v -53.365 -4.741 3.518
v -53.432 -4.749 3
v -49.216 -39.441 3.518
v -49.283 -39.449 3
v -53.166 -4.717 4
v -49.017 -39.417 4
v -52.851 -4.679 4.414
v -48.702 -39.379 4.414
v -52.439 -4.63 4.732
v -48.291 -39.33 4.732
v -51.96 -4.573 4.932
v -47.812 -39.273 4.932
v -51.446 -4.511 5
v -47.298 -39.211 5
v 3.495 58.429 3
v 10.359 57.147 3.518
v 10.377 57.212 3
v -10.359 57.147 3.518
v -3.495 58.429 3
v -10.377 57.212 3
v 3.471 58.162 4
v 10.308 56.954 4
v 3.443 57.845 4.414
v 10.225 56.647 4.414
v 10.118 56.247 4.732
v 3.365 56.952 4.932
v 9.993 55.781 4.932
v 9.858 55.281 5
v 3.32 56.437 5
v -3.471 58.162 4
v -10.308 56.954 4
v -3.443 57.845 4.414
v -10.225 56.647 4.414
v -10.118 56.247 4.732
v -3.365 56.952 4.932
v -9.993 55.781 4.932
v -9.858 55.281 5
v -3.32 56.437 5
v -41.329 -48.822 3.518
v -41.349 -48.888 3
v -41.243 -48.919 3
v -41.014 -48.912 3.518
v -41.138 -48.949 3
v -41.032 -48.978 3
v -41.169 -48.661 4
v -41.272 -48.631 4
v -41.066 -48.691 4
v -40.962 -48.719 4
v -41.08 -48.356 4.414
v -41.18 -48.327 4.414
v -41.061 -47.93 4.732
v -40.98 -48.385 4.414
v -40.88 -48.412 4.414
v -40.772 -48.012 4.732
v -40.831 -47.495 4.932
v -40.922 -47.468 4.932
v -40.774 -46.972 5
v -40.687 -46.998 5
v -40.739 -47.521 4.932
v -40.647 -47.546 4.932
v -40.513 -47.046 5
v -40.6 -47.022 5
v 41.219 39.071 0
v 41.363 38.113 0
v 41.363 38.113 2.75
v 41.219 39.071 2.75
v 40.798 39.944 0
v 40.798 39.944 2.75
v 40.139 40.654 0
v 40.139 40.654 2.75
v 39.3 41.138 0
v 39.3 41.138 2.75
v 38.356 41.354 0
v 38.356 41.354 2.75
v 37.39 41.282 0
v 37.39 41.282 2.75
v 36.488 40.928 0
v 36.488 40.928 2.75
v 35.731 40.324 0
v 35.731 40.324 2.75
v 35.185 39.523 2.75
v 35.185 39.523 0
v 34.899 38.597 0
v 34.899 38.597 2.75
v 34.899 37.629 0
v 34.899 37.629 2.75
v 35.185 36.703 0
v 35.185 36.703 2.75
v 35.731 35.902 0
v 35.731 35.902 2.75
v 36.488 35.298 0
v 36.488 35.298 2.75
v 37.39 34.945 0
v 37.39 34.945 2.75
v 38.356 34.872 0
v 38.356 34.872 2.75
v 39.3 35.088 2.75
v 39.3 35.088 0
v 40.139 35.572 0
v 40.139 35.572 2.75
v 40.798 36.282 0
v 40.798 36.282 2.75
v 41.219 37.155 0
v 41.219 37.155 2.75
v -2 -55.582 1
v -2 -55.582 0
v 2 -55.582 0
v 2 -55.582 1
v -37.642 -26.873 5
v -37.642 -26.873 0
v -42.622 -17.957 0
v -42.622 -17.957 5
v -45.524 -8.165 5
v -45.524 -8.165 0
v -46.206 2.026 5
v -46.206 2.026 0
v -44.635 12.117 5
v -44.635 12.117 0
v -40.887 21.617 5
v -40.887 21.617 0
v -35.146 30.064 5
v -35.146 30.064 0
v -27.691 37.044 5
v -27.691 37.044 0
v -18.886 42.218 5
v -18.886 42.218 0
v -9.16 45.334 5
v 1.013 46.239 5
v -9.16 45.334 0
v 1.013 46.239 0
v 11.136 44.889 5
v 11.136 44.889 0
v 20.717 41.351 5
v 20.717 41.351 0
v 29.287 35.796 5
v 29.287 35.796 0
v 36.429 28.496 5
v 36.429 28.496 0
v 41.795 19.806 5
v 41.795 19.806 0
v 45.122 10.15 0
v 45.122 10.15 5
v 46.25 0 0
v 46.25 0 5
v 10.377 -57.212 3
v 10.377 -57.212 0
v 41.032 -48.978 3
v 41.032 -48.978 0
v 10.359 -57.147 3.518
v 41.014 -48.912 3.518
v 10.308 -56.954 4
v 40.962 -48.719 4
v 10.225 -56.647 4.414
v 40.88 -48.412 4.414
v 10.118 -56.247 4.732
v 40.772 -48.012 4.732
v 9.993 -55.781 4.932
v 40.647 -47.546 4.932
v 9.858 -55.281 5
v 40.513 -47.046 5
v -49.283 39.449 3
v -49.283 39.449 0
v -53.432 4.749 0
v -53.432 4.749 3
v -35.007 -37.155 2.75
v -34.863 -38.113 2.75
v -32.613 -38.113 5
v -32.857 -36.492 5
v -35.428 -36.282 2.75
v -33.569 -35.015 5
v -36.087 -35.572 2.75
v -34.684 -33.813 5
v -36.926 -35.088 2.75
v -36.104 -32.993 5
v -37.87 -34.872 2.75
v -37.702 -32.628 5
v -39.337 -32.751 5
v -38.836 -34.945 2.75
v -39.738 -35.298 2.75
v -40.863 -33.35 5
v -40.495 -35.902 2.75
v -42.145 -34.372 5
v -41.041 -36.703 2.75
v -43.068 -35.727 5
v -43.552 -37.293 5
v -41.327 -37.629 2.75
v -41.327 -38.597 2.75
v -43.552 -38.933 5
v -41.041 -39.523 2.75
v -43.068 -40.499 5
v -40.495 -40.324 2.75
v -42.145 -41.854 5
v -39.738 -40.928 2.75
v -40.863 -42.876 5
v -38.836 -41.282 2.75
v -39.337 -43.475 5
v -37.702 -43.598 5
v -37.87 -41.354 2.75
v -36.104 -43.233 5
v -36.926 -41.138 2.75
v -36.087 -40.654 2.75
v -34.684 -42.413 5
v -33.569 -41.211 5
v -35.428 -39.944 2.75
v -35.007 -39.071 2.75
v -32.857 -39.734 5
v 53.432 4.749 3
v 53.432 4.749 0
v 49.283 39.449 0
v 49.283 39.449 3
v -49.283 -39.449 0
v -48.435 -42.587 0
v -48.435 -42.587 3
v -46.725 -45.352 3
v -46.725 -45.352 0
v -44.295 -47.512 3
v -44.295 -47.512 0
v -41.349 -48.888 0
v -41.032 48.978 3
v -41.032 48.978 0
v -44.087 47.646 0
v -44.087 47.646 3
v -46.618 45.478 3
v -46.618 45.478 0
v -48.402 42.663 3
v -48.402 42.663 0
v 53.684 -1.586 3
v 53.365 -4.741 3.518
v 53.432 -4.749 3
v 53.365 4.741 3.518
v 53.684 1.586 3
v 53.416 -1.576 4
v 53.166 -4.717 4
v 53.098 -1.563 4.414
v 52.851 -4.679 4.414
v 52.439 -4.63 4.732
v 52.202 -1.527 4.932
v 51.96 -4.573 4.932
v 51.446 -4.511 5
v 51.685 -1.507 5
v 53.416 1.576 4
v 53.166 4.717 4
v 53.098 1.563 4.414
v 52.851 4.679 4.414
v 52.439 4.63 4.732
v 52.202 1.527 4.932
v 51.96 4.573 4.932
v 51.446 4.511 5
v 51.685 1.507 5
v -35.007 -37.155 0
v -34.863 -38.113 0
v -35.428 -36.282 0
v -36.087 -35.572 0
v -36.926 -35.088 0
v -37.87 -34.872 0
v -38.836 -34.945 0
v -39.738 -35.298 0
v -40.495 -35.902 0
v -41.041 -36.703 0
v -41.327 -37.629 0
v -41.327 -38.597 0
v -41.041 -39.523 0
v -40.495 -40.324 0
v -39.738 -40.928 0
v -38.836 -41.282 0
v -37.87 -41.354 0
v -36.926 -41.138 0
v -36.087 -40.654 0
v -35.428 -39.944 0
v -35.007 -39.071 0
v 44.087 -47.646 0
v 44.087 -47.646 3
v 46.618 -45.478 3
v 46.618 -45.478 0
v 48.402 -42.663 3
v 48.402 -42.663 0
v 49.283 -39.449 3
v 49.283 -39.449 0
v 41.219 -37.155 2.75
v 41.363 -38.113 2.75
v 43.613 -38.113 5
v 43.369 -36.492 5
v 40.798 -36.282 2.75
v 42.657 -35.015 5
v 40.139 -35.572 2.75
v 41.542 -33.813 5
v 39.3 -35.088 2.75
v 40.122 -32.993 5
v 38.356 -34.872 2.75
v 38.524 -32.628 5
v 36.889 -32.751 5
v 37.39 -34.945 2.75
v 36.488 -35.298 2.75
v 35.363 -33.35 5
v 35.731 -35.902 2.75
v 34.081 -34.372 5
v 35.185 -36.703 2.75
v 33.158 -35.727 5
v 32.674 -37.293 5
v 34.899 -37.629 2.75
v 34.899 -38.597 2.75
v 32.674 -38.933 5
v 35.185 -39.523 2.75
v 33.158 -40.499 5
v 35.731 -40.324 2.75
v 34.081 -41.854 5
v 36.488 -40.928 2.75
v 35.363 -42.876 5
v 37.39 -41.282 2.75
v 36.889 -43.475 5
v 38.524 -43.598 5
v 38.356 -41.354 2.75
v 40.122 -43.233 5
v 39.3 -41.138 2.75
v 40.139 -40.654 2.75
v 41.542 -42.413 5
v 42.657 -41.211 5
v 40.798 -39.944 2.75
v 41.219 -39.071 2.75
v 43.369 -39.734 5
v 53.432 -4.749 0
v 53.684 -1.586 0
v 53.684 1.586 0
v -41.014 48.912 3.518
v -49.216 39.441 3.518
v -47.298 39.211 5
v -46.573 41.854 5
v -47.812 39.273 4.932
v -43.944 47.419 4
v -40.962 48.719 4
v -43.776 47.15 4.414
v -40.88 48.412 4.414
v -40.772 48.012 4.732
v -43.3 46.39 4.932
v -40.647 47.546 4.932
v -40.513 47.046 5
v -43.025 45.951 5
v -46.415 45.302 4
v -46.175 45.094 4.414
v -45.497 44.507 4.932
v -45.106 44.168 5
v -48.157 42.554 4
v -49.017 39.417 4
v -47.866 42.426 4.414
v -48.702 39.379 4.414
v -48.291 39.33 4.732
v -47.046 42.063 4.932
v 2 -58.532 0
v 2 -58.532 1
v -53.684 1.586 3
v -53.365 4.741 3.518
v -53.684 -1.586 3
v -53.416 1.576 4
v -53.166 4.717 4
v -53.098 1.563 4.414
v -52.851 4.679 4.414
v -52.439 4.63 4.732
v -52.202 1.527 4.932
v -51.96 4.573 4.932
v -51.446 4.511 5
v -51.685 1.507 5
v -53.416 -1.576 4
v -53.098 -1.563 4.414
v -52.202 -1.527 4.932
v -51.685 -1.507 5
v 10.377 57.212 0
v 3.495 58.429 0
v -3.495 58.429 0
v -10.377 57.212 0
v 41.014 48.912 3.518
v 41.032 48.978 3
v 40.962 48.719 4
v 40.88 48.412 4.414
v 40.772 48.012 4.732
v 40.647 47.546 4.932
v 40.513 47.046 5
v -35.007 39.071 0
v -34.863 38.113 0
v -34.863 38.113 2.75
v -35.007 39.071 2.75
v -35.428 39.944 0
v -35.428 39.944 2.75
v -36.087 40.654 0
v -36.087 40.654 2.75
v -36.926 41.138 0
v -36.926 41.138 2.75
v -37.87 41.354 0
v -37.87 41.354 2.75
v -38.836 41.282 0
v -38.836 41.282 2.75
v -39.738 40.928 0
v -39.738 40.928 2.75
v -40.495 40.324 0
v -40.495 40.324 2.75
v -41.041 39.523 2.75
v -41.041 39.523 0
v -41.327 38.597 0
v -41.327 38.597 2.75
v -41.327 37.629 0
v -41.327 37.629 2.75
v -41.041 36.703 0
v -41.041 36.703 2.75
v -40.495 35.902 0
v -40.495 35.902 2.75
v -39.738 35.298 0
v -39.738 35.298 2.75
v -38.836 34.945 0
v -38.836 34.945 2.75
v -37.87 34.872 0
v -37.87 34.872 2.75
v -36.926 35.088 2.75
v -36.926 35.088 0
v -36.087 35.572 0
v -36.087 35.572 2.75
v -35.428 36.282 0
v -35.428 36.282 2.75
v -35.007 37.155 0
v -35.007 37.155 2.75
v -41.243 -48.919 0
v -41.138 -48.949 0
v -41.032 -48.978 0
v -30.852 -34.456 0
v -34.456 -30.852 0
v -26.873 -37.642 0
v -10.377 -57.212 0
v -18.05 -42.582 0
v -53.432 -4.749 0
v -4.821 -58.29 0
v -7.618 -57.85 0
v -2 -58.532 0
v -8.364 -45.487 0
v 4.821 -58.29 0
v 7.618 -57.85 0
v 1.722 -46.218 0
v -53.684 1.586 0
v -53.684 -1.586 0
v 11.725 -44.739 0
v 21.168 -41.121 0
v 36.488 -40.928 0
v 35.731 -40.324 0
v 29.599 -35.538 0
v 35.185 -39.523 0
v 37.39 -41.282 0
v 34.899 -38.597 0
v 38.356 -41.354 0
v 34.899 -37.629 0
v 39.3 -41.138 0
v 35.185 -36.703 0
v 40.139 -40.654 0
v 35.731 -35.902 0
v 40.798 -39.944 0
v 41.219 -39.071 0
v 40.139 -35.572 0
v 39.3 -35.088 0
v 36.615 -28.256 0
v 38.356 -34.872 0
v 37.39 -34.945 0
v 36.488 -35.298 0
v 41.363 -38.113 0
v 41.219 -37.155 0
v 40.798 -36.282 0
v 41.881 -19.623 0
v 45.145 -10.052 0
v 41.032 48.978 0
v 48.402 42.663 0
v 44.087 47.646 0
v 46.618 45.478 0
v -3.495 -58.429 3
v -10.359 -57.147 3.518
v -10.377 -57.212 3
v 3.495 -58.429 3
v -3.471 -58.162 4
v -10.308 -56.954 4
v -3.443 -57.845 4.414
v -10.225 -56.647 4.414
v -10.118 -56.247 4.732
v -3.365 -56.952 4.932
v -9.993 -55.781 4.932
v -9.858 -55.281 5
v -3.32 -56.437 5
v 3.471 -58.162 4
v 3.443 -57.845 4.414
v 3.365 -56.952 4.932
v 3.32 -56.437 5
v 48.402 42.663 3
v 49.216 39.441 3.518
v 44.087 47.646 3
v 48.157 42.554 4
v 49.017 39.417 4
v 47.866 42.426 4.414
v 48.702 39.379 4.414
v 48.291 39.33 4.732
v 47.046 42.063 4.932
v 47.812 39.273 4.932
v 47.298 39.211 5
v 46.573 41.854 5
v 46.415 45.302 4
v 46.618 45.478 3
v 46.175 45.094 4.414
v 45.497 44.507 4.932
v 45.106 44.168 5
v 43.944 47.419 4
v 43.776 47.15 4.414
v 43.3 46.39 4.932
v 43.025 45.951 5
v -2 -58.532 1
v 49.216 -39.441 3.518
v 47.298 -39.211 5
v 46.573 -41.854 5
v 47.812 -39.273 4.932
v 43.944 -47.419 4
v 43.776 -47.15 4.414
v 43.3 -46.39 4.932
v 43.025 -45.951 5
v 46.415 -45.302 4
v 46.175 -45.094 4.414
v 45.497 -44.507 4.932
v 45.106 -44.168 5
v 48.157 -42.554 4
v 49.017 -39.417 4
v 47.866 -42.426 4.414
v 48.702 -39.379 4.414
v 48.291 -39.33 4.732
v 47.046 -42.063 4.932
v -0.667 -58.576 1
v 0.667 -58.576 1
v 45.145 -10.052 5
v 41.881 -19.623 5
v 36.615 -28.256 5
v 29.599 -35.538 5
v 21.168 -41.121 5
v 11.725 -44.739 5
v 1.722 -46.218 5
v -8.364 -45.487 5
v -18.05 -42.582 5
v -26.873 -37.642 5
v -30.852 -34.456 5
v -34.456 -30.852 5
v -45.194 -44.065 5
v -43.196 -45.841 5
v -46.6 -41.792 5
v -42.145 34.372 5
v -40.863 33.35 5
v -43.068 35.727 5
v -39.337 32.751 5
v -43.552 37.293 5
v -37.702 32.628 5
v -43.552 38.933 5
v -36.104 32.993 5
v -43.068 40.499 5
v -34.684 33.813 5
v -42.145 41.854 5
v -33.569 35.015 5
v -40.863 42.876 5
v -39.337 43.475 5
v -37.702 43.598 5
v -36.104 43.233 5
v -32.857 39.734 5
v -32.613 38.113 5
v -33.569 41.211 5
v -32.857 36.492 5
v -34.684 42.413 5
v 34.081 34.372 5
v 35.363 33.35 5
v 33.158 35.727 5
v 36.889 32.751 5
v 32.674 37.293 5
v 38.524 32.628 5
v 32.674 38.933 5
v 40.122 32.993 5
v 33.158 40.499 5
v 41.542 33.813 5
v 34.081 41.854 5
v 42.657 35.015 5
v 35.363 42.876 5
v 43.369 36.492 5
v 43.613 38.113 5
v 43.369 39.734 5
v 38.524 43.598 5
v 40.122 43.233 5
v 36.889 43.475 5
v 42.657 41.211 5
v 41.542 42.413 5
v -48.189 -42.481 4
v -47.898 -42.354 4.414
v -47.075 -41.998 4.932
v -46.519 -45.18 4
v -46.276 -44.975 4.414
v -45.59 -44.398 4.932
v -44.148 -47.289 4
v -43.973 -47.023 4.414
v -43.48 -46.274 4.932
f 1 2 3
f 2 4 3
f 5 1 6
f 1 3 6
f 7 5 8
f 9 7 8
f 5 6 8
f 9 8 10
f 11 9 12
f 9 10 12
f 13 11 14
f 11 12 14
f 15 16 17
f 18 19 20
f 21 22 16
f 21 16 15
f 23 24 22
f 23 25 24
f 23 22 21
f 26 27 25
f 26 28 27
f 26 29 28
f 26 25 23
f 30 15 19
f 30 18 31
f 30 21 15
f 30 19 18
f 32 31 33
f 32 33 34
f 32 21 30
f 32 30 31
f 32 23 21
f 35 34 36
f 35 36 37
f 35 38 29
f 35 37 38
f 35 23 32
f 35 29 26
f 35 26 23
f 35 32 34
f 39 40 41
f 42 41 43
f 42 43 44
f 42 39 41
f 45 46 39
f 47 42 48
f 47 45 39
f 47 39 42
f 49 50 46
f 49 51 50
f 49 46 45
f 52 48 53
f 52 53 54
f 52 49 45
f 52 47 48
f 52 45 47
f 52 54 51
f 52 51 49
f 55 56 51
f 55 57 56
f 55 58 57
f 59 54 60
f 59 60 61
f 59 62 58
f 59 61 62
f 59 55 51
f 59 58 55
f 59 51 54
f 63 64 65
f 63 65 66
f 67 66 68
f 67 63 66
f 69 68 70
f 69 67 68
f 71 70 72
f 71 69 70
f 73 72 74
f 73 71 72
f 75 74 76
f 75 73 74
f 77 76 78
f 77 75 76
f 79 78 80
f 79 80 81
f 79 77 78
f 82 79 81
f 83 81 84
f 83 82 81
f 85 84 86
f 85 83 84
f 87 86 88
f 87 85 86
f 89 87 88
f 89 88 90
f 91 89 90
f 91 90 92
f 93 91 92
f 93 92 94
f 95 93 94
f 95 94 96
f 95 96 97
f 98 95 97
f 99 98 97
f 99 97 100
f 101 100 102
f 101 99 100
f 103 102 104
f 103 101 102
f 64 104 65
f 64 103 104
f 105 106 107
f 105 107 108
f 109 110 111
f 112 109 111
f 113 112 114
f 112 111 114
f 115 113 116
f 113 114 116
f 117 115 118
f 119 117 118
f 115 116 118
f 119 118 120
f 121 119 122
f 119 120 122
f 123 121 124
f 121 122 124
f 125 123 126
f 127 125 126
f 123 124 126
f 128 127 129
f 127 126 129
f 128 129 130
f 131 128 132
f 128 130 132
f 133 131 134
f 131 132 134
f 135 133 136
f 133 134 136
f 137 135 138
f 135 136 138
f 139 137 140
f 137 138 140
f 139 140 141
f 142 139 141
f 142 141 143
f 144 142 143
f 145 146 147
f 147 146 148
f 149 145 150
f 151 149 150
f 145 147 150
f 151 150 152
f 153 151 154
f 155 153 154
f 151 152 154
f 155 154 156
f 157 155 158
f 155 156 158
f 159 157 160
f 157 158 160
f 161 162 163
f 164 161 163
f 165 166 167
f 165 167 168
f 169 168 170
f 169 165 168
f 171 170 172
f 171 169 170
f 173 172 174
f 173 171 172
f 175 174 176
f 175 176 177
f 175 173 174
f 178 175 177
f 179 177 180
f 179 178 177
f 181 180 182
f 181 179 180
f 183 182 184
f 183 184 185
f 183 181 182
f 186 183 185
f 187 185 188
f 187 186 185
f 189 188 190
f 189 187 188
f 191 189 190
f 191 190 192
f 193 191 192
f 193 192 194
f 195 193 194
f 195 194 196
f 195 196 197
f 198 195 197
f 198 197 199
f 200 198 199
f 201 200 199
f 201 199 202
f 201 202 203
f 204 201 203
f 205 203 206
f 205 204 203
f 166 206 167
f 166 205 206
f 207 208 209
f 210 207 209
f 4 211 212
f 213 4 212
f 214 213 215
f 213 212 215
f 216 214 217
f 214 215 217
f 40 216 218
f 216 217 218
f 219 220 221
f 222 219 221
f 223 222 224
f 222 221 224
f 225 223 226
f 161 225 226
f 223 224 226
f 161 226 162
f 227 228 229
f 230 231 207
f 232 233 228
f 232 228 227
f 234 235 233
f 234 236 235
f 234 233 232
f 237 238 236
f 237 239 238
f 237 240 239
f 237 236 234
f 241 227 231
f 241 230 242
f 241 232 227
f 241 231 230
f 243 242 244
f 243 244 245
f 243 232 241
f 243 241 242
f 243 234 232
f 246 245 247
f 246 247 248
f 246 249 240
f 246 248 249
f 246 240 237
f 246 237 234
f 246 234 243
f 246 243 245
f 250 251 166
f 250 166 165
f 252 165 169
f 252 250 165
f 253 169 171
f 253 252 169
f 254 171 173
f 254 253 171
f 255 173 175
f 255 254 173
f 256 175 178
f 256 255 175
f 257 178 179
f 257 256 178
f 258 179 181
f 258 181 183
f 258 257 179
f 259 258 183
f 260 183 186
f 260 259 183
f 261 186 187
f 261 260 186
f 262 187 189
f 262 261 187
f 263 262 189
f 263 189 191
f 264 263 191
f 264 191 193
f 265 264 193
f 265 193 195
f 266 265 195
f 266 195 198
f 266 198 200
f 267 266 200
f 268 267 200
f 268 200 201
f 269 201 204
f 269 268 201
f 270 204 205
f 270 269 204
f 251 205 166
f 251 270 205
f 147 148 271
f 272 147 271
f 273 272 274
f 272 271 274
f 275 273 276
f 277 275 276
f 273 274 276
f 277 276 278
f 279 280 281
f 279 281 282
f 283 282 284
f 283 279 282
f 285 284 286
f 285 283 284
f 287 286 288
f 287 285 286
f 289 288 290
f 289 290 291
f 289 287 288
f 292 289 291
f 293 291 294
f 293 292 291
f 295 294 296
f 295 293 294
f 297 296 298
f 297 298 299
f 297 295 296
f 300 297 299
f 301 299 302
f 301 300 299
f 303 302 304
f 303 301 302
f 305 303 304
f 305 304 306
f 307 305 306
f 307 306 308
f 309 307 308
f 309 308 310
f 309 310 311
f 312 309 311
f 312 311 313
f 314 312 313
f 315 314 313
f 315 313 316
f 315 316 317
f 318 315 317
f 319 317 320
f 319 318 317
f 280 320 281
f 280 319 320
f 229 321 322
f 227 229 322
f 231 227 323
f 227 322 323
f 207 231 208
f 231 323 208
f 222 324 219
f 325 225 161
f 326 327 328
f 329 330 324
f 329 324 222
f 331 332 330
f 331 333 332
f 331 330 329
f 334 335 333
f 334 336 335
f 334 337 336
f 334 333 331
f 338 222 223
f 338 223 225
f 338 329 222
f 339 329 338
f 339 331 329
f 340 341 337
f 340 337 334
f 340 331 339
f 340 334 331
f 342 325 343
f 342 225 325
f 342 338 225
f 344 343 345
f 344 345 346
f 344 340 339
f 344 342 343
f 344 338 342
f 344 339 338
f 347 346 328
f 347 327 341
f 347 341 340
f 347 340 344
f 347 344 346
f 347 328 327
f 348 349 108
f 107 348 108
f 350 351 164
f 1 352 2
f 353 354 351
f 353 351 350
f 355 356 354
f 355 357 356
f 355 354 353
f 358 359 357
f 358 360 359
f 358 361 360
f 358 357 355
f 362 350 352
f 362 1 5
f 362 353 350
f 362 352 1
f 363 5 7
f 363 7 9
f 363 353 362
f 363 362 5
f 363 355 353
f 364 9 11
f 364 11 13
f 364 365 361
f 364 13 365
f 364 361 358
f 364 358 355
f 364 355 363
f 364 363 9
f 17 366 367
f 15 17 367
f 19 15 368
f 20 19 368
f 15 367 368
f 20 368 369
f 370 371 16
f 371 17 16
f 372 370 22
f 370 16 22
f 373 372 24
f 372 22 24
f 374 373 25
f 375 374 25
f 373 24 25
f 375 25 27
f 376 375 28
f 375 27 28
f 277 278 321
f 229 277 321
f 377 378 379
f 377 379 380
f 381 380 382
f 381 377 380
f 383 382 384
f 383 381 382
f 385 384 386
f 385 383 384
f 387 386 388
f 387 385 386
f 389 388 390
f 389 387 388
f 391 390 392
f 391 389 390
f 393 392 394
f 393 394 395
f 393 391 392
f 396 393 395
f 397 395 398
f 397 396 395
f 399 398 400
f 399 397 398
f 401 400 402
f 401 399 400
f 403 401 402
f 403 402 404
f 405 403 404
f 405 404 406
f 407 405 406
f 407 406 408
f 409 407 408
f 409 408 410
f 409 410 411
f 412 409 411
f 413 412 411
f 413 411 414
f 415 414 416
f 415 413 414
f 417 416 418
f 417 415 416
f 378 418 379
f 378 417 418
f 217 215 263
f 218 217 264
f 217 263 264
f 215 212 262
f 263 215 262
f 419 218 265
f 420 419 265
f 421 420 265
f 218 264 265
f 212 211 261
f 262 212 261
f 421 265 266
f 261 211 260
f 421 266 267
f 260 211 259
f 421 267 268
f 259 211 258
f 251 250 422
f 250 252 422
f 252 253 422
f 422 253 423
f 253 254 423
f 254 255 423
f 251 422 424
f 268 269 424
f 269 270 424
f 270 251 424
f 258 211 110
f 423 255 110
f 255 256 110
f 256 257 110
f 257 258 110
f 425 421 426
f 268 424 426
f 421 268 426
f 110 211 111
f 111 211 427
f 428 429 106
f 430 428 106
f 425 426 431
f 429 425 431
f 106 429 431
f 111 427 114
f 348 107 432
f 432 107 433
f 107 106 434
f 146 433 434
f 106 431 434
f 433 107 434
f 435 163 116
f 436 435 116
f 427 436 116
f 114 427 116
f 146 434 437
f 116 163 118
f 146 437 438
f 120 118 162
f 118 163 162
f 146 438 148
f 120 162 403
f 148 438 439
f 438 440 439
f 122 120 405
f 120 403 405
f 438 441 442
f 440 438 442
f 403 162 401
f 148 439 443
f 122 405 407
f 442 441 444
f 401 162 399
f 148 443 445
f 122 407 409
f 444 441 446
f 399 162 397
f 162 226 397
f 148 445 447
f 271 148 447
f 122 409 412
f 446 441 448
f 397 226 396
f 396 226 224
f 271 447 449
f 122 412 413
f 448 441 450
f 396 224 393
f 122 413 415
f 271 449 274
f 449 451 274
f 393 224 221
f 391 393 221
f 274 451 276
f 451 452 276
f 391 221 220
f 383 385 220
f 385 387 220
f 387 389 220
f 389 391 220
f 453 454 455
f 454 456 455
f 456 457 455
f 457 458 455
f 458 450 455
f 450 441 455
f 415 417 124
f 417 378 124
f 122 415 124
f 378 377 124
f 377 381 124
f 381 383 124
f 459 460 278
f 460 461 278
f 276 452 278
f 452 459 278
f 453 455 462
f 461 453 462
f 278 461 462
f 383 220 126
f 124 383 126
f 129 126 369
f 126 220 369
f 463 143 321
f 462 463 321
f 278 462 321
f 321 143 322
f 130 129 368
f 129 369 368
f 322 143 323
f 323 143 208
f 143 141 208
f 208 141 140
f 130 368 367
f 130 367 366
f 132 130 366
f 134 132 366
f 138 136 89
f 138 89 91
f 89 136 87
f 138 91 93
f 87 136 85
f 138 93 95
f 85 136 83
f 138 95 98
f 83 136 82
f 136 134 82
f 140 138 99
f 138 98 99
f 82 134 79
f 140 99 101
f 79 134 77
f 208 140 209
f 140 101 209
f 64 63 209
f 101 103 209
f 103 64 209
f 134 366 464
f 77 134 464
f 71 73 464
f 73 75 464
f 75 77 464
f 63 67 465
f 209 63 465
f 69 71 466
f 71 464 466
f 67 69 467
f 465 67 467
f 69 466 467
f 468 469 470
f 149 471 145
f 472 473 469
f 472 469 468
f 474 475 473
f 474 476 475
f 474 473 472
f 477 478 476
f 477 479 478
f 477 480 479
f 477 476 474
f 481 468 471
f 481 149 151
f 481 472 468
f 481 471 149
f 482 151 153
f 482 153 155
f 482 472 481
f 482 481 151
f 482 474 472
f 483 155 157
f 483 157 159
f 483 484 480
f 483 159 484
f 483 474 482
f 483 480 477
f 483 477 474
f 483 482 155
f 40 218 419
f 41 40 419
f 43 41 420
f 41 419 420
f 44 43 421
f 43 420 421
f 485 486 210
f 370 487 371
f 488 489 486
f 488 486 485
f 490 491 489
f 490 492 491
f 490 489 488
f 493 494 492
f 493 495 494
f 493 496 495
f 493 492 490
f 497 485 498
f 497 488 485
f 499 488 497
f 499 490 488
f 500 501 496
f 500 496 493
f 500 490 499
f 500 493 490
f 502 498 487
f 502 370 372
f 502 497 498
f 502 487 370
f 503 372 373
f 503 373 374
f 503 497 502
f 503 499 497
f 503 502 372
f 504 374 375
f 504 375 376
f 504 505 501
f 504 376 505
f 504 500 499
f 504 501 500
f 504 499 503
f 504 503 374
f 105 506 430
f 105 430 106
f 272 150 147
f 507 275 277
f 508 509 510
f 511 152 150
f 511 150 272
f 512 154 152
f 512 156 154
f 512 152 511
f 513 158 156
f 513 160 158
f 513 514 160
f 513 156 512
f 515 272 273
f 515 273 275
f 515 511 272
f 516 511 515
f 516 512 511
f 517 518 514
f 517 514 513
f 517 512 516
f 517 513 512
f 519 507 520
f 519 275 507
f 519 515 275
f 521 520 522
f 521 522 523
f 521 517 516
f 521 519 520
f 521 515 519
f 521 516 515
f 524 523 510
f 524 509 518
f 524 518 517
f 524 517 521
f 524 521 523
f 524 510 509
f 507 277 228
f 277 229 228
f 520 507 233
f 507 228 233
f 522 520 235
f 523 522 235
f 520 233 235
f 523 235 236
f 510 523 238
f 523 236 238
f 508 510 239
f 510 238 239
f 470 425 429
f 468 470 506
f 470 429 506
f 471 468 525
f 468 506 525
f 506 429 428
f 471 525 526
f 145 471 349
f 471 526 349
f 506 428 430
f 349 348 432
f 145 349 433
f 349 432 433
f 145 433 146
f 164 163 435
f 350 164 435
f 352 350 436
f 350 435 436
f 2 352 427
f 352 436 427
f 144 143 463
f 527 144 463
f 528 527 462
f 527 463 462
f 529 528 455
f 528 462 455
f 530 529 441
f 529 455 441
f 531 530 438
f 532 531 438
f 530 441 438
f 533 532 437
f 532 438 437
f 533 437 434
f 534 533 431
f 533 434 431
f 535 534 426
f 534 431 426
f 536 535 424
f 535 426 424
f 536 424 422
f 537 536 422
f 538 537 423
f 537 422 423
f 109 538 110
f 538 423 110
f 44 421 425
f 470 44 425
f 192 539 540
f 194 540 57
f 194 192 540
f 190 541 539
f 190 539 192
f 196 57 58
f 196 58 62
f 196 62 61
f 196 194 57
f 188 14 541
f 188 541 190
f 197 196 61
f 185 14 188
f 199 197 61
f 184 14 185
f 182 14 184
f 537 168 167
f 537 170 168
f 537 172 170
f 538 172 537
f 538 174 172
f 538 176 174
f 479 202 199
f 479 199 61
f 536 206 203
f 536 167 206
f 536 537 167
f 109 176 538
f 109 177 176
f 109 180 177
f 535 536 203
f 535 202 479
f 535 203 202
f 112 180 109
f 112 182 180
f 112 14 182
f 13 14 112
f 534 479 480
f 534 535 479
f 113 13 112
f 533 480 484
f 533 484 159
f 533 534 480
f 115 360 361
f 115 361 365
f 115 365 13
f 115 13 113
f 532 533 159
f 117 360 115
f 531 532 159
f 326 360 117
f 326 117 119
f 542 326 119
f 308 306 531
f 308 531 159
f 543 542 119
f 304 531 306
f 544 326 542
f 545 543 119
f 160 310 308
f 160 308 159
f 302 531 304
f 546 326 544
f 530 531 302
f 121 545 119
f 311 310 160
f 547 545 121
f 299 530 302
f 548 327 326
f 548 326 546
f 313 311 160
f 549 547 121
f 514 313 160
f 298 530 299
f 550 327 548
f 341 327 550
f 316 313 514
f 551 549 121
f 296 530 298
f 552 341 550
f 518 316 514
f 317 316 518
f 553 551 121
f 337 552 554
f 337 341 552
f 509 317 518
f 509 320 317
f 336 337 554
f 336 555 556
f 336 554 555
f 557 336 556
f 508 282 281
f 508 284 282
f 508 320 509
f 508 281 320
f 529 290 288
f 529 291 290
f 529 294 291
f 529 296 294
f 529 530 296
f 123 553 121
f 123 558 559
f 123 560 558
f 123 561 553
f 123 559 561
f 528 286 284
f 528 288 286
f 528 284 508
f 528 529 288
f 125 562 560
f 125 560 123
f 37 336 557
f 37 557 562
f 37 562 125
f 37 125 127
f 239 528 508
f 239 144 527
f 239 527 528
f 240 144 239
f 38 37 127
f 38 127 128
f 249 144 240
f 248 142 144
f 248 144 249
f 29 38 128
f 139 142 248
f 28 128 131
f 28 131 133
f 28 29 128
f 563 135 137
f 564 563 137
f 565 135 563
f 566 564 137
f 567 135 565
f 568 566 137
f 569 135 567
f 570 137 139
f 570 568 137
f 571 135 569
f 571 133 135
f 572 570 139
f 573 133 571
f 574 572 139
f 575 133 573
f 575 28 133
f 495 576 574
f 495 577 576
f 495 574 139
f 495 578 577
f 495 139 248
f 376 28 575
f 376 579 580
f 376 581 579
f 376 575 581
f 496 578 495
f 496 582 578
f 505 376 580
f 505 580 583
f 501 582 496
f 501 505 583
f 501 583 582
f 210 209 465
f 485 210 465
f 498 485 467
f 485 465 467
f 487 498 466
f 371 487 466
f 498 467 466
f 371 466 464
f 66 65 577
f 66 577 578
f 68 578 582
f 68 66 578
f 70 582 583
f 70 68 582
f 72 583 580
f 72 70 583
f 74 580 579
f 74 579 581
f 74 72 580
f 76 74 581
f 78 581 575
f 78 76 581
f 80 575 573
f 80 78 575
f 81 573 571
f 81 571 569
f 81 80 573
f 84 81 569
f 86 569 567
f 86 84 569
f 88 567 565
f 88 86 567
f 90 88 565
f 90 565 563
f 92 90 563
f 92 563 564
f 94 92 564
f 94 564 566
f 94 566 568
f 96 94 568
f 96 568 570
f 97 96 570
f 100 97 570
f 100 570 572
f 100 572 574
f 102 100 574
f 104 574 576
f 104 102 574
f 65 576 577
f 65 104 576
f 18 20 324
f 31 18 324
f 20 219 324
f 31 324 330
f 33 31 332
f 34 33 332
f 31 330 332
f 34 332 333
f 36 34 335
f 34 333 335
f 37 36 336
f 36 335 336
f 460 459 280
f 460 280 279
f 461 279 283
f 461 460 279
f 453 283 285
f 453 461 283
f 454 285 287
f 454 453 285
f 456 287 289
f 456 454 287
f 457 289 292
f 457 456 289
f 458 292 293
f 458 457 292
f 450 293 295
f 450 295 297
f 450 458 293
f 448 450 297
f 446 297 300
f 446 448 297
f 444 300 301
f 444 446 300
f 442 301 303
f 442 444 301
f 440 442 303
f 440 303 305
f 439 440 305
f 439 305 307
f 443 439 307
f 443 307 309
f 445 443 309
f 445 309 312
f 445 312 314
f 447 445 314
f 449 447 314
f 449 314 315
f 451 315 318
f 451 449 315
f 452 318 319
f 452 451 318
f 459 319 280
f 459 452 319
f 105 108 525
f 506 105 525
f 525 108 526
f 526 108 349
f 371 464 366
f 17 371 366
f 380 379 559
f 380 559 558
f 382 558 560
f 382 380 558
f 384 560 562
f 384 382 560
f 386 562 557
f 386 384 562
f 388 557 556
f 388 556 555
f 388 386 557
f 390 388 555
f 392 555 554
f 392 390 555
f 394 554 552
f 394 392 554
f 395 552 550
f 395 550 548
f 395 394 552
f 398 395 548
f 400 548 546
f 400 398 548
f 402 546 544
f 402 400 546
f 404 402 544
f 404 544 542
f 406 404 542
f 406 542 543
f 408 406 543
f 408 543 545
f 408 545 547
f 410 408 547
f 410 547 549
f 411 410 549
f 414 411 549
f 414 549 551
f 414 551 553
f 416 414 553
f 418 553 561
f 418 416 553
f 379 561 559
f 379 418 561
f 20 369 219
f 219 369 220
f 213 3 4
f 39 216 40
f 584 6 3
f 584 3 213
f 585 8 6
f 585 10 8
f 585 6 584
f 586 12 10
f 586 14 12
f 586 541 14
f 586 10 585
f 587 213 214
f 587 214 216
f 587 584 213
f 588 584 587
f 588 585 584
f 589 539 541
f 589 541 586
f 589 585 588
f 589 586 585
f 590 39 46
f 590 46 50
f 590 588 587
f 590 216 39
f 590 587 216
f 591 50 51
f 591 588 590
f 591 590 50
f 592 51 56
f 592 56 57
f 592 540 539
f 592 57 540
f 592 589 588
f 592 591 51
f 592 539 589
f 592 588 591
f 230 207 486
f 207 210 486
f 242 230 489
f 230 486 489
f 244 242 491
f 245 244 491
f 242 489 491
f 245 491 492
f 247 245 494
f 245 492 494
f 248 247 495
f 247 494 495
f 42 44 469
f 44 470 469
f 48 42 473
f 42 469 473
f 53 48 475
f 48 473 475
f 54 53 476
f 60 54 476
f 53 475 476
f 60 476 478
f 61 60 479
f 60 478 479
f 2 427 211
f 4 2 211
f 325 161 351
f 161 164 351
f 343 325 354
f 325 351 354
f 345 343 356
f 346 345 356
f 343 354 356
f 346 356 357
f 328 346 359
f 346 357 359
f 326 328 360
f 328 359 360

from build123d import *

# Parameters (mm, degrees)
F0_R          = 3.25
F1_DEPTH      = 5
F2_R          = 2
F3_SIZE       = 2.25
F5_DEPTH      = 2
F5_DEPTH_BACK = 2


with BuildPart() as f1:
    # F0 (on Top) → F1 (new body)
    with BuildSketch(Plane.XY):
        with BuildLine():
            ThreePointArc((-37.6418413316, -26.8729284069), (-14.1089924944, 44.0454178184), (46.25, 0))
            ThreePointArc((46.25, 0), (21.1682493511, -41.121377888), (-26.8729284069, -37.6418413316))
            ThreePointArc((-26.8729284069, -37.6418413316), (-31.0817991261, -46.8950788332), (-41.0316193316, -48.9778834013))
            Line((-41.0316193316, -48.9778834013), (-10.3771158244, -57.212447804))
            ThreePointArc((-10.3771158244, -57.212447804), (0, -58.5819486205), (10.3771158244, -57.212447804))
            Line((10.3771158244, -57.212447804), (41.0316193316, -48.9778834013))
            ThreePointArc((41.0316193316, -48.9778834013), (46.6175743255, -45.4775418864), (49.2834994538, -39.44860109))
            Line((49.2834994538, -39.44860109), (53.4322534987, -4.7486065209))
            ThreePointArc((53.4322534987, -4.7486065209), (53.7151194618, 0), (53.4322534987, 4.7486065209))
            Line((53.4322534987, 4.7486065209), (49.2834994538, 39.44860109))
            ThreePointArc((49.2834994538, 39.44860109), (46.6175743255, 45.4775418864), (41.0316193316, 48.9778834013))
            Line((41.0316193316, 48.9778834013), (10.3771158244, 57.212447804))
            ThreePointArc((10.3771158244, 57.212447804), (0, 58.5819486205), (-10.3771158244, 57.212447804))
            Line((-10.3771158244, 57.212447804), (-41.0316193316, 48.9778834013))
            ThreePointArc((-41.0316193316, 48.9778834013), (-46.6175743255, 45.4775418864), (-49.2834994538, 39.44860109))
            Line((-49.2834994538, 39.44860109), (-53.4322534987, 4.7486065209))
            ThreePointArc((-53.4322534987, 4.7486065209), (-53.7151194618, 0), (-53.4322534987, -4.7486065209))
            Line((-53.4322534987, -4.7486065209), (-49.2834994538, -39.44860109))
            ThreePointArc((-49.2834994538, -39.44860109), (-46.3686757307, -30.4705928986), (-37.6418413316, -26.8729284069))
        make_face()
        with Locations((38.113055506, -38.113055506)):
            Circle(F0_R, mode=Mode.SUBTRACT)
        with Locations((-38.113055506, 38.113055506)):
            Circle(F0_R, mode=Mode.SUBTRACT)
        with Locations((38.113055506, 38.113055506)):
            Circle(F0_R, mode=Mode.SUBTRACT)
        with BuildLine():
            ThreePointArc((-26.8729284069, -37.6418413316), (-32.7036886299, -32.7036886299), (-37.6418413316, -26.8729284069))
            ThreePointArc((-37.6418413316, -26.8729284069), (-46.3686757307, -30.4705928986), (-49.2834994538, -39.44860109))
            ThreePointArc((-49.2834994538, -39.44860109), (-46.7245900781, -45.3521143062), (-41.3487870684, -48.8876803837))
            ThreePointArc((-41.3487870684, -48.8876803837), (-41.1905337069, -48.9339440057), (-41.0316193316, -48.9778834013))
            ThreePointArc((-41.0316193316, -48.9778834013), (-31.0817991261, -46.8950788332), (-26.8729284069, -37.6418413316))
        make_face()
        with Locations((-38.113055506, -38.113055506)):
            Circle(F0_R, mode=Mode.SUBTRACT)
    extrude(amount=F1_DEPTH)

    # F2
    f2_edges = [f1.edges().sort_by_distance(p)[0] for p in [
        (-25.704368, 53.095166, 5),
    ]]
    fillet(f2_edges, radius=F2_R)

    # F3
    f3_edges = [f1.edges().sort_by_distance(p)[0] for p in [
        (-41.363056, 38.113056, 5),
        (34.863056, 38.113056, 5),
        (34.863056, -38.113056, 5),
        (-41.363056, -38.113056, 5),
    ]]
    chamfer(f3_edges, length=F3_SIZE)

    # F4 (on Right) → F5 (cut, two sides)
    with BuildSketch(Plane.YZ) as f5_sk:
        Polygon((-58.5819486205, 0), (-57.212447804, 0), (-55.5819486205, 0), (-55.5819486205, 1), (-58.5819486205, 1), align=None)
    extrude(amount=-F5_DEPTH, mode=Mode.SUBTRACT)
    extrude(f5_sk.sketch, amount=F5_DEPTH_BACK, mode=Mode.SUBTRACT)


solid = f1.part
